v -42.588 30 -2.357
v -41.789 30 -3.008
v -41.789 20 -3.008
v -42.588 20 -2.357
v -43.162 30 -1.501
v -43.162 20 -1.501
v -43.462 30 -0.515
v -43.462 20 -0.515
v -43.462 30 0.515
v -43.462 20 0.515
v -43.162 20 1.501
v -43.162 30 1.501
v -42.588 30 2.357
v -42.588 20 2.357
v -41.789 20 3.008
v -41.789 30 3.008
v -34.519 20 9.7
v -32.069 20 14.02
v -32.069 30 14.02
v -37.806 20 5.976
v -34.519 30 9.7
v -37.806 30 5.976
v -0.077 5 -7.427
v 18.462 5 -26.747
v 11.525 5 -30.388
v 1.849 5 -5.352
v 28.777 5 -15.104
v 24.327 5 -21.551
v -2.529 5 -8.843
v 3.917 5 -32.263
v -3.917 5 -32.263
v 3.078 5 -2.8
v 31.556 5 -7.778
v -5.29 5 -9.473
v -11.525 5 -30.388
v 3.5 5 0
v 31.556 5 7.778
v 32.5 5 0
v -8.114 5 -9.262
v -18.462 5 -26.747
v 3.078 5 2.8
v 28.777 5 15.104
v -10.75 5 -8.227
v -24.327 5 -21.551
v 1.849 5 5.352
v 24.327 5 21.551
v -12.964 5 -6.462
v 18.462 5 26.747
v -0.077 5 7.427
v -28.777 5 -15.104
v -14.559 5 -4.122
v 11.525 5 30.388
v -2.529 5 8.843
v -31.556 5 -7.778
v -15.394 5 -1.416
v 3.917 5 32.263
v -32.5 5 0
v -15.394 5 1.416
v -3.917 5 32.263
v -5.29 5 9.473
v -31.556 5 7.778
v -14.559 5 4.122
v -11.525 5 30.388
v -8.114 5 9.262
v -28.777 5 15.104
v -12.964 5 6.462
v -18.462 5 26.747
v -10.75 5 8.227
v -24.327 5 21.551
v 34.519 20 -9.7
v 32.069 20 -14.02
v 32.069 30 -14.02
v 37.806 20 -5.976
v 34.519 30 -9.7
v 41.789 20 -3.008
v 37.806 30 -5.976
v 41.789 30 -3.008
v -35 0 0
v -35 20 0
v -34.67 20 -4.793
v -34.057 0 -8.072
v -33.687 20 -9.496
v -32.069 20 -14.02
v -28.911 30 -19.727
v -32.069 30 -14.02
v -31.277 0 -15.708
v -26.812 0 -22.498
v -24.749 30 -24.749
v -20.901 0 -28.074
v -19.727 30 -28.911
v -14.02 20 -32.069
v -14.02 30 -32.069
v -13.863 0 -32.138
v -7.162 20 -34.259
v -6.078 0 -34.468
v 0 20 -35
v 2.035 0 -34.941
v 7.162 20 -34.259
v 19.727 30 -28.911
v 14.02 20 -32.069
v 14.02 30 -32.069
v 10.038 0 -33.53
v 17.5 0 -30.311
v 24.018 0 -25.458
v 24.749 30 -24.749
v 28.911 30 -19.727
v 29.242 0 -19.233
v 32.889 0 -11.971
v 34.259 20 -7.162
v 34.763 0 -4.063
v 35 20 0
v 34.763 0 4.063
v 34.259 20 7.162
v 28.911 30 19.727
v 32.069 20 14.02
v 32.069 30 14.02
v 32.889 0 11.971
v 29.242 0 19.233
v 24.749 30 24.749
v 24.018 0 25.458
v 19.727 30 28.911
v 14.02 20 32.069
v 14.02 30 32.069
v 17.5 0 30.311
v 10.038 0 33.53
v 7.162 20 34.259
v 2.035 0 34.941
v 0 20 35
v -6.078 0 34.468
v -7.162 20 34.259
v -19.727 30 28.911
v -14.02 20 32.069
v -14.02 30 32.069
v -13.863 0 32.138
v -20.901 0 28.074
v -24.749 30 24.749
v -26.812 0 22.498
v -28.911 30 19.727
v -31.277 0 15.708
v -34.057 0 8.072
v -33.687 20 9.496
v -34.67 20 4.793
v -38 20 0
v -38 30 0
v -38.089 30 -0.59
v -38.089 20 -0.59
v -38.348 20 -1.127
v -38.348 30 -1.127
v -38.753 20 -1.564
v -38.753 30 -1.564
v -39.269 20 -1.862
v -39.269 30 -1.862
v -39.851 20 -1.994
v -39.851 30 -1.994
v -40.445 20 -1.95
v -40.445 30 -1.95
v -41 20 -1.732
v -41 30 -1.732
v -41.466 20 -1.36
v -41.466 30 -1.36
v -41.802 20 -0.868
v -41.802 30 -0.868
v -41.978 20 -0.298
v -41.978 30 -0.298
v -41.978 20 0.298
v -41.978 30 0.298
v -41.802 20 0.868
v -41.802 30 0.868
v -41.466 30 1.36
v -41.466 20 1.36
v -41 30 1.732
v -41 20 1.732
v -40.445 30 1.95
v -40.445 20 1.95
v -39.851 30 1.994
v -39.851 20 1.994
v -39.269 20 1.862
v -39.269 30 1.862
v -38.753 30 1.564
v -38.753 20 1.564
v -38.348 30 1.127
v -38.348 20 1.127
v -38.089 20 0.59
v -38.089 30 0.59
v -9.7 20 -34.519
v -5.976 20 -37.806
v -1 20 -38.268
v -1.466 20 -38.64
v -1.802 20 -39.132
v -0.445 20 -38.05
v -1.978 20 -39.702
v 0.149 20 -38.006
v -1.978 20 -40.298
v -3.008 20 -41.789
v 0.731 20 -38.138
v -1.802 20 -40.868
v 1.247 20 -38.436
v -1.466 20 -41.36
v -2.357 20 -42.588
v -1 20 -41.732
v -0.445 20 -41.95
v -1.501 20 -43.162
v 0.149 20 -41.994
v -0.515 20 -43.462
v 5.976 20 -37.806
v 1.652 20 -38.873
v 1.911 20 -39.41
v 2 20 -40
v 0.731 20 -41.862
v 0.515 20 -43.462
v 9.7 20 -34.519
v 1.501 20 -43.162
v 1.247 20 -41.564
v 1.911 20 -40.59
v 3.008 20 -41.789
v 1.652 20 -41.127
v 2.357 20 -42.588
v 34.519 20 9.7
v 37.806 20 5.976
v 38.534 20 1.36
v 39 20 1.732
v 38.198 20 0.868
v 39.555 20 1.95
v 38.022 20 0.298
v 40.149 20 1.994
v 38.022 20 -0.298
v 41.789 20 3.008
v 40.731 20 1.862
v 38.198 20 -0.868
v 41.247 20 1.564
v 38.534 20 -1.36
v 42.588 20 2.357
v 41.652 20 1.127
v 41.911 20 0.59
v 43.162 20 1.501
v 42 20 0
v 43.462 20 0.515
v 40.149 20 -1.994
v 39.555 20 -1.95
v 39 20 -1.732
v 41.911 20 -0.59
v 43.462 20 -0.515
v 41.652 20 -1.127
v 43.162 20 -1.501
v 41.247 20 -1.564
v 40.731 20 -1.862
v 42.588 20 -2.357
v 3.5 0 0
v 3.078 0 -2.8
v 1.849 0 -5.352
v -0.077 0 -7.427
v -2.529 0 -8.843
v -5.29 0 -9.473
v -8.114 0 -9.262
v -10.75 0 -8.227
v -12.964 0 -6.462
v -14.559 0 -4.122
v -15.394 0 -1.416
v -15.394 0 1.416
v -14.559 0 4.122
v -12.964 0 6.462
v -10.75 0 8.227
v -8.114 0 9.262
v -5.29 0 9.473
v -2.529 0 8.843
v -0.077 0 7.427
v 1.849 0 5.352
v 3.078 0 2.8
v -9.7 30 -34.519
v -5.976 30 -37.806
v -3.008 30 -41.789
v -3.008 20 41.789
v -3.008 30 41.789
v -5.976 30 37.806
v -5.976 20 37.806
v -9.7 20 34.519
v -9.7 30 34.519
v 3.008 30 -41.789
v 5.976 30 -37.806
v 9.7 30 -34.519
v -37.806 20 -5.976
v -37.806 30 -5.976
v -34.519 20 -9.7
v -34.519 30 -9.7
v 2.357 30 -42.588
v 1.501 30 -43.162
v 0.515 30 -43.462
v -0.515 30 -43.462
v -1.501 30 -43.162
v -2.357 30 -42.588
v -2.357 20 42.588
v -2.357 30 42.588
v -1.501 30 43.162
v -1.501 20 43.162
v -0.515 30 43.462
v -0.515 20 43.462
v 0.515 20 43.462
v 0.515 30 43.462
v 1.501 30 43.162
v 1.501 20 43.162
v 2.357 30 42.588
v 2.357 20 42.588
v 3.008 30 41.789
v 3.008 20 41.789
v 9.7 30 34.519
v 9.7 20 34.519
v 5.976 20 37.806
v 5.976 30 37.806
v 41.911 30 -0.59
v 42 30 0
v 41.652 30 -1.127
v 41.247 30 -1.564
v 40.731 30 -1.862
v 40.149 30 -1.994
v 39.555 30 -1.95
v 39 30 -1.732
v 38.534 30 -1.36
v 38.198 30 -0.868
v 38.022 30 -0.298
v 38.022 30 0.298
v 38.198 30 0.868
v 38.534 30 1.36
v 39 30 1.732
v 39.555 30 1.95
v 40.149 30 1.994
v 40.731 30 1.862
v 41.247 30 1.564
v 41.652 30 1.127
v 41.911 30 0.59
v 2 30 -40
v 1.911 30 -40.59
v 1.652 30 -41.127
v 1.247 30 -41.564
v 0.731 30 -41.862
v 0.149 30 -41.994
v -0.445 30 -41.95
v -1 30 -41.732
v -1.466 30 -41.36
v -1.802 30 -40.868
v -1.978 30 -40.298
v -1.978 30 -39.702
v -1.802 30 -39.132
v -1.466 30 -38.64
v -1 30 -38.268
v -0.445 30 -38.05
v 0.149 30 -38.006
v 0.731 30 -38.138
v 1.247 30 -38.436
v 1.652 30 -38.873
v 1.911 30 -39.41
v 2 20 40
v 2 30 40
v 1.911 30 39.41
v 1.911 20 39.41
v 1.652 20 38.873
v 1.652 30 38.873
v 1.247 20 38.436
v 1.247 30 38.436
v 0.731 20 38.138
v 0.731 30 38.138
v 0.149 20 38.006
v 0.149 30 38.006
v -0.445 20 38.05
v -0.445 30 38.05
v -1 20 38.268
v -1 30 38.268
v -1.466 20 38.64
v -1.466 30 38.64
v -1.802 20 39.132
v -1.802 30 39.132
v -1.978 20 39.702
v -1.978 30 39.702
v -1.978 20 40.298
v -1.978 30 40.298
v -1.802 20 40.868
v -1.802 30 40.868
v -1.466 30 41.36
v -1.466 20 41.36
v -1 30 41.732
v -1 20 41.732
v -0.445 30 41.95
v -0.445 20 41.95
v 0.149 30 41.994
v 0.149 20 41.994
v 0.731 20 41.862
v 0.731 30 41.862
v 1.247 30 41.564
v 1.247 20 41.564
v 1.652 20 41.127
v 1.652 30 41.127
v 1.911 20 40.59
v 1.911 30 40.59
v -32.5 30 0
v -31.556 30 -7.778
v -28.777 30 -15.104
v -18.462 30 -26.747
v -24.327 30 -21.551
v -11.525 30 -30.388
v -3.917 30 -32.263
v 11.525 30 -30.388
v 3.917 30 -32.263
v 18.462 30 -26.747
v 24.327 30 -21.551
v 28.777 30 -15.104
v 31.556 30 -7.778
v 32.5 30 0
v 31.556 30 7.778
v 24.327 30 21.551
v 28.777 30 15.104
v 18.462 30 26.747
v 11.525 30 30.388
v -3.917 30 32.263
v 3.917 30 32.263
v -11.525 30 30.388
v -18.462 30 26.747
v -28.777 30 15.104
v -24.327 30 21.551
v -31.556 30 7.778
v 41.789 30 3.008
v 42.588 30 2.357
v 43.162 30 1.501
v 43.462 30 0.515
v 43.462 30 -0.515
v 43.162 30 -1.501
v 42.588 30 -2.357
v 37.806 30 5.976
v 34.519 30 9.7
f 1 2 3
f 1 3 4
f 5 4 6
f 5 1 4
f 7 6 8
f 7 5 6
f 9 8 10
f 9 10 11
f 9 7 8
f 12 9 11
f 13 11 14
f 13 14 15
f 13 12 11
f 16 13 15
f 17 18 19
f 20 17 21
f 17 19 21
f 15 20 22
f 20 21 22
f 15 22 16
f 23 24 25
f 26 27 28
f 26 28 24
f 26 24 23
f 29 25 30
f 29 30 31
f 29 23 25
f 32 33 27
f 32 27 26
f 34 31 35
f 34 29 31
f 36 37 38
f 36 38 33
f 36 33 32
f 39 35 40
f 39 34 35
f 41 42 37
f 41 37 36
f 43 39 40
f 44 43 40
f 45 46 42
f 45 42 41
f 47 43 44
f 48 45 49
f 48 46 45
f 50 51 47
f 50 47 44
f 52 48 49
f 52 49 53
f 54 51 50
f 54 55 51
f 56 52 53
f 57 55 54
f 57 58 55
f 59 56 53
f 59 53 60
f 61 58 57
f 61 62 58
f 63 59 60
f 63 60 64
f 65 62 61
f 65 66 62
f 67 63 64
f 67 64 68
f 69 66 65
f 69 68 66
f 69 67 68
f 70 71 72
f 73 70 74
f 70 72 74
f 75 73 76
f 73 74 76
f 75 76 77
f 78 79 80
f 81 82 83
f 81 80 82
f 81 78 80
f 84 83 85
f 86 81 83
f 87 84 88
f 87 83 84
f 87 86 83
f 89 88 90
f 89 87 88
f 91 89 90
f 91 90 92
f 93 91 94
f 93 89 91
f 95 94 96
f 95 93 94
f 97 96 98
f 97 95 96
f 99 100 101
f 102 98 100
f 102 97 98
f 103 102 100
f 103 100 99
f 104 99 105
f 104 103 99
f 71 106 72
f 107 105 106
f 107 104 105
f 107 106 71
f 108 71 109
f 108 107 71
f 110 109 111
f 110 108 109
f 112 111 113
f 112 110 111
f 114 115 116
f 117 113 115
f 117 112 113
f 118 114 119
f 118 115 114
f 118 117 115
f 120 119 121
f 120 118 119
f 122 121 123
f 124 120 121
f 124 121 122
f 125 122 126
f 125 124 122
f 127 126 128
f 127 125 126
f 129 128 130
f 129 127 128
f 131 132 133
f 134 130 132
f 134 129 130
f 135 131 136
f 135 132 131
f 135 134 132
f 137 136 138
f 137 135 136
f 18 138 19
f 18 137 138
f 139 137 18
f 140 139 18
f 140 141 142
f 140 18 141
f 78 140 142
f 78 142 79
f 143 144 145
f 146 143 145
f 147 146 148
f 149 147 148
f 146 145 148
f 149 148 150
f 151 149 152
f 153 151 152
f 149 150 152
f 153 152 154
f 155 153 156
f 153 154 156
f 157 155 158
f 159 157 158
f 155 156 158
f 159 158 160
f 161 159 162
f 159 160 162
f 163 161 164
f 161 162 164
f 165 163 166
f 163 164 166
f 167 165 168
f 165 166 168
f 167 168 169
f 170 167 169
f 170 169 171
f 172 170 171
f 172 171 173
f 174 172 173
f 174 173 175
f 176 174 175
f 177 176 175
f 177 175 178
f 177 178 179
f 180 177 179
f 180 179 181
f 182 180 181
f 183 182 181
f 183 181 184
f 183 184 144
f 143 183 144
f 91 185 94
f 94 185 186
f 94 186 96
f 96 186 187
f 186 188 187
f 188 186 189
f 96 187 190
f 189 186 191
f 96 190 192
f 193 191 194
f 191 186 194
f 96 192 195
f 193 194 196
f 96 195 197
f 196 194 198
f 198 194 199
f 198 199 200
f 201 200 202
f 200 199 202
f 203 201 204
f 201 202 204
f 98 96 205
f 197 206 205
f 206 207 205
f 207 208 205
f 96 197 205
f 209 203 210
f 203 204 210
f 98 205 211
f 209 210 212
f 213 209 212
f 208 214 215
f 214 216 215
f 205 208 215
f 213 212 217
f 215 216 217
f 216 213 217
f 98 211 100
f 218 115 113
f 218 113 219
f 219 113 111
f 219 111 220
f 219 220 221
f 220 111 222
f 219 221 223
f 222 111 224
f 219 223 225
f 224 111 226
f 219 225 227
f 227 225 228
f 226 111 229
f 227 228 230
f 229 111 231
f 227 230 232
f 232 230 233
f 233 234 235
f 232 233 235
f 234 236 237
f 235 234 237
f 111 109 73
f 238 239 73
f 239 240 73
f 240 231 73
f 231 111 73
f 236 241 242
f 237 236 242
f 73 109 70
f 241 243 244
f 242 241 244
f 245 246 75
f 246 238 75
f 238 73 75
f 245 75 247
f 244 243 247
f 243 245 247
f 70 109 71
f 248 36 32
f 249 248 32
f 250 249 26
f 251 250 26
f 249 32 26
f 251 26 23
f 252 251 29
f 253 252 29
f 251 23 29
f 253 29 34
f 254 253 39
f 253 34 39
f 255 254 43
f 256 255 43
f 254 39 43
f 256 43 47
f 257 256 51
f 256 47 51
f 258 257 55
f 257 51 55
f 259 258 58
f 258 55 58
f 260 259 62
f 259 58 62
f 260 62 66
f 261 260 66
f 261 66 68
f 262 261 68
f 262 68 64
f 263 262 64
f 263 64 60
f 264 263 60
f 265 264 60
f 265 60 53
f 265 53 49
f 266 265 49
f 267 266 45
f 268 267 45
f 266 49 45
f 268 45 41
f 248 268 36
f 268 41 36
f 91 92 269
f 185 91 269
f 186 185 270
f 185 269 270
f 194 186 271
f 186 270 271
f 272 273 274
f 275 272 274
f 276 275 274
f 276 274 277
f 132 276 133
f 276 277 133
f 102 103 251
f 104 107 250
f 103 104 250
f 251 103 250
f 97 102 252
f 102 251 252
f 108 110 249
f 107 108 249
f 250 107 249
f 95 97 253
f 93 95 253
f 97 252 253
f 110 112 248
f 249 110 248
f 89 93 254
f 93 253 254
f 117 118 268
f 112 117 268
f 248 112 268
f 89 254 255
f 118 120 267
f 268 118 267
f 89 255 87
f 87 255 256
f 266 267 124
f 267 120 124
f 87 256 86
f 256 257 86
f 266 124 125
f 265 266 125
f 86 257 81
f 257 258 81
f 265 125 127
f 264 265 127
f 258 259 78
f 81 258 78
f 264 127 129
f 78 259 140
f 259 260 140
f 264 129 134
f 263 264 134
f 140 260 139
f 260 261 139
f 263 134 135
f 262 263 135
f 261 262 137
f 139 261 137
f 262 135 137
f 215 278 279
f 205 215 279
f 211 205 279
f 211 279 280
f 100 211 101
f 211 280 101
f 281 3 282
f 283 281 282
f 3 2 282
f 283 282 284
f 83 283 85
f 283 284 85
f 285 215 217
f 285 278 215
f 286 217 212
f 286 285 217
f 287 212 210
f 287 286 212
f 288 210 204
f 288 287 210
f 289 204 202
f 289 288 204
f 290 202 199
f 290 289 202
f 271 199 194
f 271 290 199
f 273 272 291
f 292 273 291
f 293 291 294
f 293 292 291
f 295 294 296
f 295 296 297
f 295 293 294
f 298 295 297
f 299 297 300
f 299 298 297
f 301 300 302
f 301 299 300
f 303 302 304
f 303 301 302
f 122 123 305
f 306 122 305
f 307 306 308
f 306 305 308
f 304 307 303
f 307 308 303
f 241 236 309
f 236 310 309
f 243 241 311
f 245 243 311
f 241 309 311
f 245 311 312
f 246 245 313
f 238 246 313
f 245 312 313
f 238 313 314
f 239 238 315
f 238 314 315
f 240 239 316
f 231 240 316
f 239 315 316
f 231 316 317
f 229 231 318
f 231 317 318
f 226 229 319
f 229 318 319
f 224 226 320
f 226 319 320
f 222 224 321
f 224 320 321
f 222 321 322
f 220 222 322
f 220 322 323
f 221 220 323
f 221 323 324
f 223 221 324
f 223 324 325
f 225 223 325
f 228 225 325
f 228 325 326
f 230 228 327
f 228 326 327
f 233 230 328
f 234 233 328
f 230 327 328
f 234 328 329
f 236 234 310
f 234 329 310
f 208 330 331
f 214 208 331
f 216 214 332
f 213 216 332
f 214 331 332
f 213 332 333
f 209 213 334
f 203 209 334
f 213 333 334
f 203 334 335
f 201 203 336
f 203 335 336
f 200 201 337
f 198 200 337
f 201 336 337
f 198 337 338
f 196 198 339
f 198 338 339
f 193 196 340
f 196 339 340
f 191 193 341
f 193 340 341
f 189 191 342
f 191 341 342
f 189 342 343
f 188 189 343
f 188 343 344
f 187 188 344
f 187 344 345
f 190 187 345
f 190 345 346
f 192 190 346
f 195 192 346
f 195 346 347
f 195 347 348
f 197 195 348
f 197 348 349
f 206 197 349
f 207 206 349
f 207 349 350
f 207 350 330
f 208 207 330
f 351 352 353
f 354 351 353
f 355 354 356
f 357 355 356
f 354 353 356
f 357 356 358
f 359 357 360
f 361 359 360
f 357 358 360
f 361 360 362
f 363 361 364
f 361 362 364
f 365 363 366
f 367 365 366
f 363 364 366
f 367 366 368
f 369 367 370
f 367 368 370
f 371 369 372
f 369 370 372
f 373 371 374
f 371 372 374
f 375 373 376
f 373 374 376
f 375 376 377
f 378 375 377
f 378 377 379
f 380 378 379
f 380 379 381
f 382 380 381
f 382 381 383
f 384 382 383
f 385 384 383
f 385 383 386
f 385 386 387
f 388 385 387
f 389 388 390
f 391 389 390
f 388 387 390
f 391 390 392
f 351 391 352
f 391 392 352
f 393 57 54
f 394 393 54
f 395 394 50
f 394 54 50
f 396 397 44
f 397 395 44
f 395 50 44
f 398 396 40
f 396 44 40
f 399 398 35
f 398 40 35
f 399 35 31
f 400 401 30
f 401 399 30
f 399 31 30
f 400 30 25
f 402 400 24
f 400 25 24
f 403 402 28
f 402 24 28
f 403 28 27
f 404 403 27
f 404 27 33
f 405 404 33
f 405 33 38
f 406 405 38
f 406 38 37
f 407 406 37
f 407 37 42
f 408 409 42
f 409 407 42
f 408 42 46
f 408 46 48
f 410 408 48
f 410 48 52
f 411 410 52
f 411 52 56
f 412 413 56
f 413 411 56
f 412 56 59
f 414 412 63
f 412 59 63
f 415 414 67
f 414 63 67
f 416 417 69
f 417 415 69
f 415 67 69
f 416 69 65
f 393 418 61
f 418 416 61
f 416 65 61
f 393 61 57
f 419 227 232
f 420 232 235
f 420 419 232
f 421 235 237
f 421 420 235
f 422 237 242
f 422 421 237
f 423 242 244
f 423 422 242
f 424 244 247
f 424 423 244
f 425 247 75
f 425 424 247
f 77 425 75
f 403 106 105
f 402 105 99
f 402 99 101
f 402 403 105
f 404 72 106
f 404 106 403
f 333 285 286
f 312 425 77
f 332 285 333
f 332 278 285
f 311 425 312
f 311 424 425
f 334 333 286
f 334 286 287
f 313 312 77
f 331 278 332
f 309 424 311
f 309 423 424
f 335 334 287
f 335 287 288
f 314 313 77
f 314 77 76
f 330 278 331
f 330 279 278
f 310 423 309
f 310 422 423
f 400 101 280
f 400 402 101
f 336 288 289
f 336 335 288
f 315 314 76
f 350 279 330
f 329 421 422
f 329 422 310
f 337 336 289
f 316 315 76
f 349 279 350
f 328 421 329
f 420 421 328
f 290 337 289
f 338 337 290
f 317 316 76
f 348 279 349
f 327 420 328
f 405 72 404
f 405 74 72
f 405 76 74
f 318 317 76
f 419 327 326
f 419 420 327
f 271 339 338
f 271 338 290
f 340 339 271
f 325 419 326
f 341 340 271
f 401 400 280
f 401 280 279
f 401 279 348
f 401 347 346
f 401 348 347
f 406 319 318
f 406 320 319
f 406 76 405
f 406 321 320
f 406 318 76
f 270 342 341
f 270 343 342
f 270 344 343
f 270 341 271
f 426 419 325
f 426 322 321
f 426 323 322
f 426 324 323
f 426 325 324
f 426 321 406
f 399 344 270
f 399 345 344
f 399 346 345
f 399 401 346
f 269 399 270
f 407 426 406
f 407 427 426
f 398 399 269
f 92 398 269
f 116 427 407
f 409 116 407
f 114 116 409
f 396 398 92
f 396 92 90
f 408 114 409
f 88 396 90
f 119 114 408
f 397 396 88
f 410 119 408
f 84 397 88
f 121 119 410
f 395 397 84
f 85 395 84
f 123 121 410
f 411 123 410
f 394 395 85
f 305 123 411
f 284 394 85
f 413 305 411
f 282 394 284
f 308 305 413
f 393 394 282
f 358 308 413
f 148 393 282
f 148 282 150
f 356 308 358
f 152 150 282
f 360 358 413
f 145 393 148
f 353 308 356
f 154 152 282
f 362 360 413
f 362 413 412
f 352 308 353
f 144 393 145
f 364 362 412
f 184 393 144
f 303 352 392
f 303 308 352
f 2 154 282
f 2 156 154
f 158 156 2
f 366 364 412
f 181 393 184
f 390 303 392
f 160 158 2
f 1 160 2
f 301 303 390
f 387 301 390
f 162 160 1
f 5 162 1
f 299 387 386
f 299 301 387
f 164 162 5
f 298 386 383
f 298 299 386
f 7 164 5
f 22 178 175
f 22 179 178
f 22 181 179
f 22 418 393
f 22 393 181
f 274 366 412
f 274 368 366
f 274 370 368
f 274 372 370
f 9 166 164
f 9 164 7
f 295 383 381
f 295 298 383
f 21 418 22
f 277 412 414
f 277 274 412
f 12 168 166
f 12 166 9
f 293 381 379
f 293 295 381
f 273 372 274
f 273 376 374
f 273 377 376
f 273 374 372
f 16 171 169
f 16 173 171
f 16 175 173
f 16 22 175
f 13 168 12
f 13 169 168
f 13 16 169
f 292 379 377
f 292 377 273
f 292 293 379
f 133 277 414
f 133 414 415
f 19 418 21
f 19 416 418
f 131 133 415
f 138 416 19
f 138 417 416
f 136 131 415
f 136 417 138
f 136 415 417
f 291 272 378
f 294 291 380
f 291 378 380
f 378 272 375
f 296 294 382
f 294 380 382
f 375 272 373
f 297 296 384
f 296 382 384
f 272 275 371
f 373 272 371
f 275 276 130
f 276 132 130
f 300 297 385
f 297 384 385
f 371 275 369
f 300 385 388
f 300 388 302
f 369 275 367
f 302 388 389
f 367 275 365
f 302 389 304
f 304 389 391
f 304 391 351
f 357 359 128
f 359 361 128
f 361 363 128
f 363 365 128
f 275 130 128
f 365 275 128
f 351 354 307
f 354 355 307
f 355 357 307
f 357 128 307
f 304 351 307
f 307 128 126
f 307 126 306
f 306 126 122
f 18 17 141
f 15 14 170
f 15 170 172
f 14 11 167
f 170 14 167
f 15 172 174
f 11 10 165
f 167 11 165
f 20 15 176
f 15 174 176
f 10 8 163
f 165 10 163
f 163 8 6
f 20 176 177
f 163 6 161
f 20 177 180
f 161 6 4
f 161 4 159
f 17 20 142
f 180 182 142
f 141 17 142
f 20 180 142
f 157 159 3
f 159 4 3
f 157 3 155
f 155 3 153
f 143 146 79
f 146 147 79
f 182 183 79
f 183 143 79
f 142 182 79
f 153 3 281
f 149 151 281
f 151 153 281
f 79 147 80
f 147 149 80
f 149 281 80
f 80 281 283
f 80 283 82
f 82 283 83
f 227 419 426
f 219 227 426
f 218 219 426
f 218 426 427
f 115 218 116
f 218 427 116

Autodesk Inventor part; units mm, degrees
ref_plane "YZ Plane" through (0, 0, 0) normal (1, 0, 0) x (0, 1, 0)
sketch "Sketch1" plane through (0, 0, 0) normal (0, 1, 0) x (-1, 0, 0)
  circle A0 centre (0, 0) radius 35
  circle A1 centre (0, 0) radius 32.5
  dimension "d0" = 70
  dimension "d2" = 65
extrude "Extrusion3" add sketch "Sketch1" along normal blind 5 contours A1
extrude "Extrusion4" add sketch "Sketch1" along normal blind 30
ref_plane "Work Plane1" through (0, 17.5, 0) normal (0, 1, 0) x (-1, 0, 0)
ref_plane "Work Plane2" through (0, 0, -40) normal (0, 0, 1) x (1, 0, 0)
sketch "Sketch5" plane through (0, 30, 0) normal (0, 1, 0) x (1, 0, 0)
  circle A0 centre (-40, 0) radius 2
  circle A1 centre (-40, 0) radius 3.5
  circle A2 centre (0, 0) radius 35 projected
  arc A3 (-41.7894, 3.008) -> (-32.0691, 14.0204) centre (-54.0594, 23.6344) ccw
  arc A4 (-32.0691, -14.0204) -> (-41.7894, -3.008) centre (-54.0594, -23.6344) ccw
  circle A5 centre (0, -40) radius 3.5
  circle A6 centre (0, -40) radius 2
  arc A7 (-3.008, -41.7894) -> (-14.0204, -32.0691) centre (-23.6344, -54.0594) ccw
  arc A8 (14.0204, -32.0691) -> (3.008, -41.7894) centre (23.6344, -54.0594) ccw
  circle A9 centre (40, 0) radius 3.5
  circle A10 centre (40, 0) radius 2
  arc A11 (41.7894, -3.008) -> (32.0691, -14.0204) centre (54.0594, -23.6344) ccw
  arc A12 (32.0691, 14.0204) -> (41.7894, 3.008) centre (54.0594, 23.6344) ccw
  circle A13 centre (0, 40) radius 3.5
  circle A14 centre (0, 40) radius 2
  arc A15 (3.008, 41.7894) -> (14.0204, 32.0691) centre (23.6344, 54.0594) ccw
  arc A16 (-14.0204, 32.0691) -> (-3.008, 41.7894) centre (-23.6344, 54.0594) ccw
  point P0 (14.0204, -32.0691)
  point P1 (-14.0204, -32.0691)
  point P2 (32.0691, 14.0204)
  point P3 (-14.0204, 32.0691)
  point P4 (14.0204, 32.0691)
  dimension "d37" = 4
  dimension "d38" = 7
  dimension "d40" = 24
  dimension "d41" = 40
  dimension "d44" = 360
extrude "Extrusion9" add sketch "Sketch5" against normal blind 10 contours A1 | A1 A3 A2 A4 | A16 A13 A15 A2 | A2 A8 A5 A7 | A13 | A5 | A12 A9 A11 A2 | A9
sketch "Sketch6" plane through (0, 5, 0) normal (0, 1, 0) x (1, 0, 0)
  circle A0 centre (-6, 0) radius 9.5
  point P0 (0, 0)
  dimension "d48" = 19
  dimension "d49" = 6
extrude "Extrusion10" cut sketch "Sketch6" against normal blind 10
properties part number "carcaza"
